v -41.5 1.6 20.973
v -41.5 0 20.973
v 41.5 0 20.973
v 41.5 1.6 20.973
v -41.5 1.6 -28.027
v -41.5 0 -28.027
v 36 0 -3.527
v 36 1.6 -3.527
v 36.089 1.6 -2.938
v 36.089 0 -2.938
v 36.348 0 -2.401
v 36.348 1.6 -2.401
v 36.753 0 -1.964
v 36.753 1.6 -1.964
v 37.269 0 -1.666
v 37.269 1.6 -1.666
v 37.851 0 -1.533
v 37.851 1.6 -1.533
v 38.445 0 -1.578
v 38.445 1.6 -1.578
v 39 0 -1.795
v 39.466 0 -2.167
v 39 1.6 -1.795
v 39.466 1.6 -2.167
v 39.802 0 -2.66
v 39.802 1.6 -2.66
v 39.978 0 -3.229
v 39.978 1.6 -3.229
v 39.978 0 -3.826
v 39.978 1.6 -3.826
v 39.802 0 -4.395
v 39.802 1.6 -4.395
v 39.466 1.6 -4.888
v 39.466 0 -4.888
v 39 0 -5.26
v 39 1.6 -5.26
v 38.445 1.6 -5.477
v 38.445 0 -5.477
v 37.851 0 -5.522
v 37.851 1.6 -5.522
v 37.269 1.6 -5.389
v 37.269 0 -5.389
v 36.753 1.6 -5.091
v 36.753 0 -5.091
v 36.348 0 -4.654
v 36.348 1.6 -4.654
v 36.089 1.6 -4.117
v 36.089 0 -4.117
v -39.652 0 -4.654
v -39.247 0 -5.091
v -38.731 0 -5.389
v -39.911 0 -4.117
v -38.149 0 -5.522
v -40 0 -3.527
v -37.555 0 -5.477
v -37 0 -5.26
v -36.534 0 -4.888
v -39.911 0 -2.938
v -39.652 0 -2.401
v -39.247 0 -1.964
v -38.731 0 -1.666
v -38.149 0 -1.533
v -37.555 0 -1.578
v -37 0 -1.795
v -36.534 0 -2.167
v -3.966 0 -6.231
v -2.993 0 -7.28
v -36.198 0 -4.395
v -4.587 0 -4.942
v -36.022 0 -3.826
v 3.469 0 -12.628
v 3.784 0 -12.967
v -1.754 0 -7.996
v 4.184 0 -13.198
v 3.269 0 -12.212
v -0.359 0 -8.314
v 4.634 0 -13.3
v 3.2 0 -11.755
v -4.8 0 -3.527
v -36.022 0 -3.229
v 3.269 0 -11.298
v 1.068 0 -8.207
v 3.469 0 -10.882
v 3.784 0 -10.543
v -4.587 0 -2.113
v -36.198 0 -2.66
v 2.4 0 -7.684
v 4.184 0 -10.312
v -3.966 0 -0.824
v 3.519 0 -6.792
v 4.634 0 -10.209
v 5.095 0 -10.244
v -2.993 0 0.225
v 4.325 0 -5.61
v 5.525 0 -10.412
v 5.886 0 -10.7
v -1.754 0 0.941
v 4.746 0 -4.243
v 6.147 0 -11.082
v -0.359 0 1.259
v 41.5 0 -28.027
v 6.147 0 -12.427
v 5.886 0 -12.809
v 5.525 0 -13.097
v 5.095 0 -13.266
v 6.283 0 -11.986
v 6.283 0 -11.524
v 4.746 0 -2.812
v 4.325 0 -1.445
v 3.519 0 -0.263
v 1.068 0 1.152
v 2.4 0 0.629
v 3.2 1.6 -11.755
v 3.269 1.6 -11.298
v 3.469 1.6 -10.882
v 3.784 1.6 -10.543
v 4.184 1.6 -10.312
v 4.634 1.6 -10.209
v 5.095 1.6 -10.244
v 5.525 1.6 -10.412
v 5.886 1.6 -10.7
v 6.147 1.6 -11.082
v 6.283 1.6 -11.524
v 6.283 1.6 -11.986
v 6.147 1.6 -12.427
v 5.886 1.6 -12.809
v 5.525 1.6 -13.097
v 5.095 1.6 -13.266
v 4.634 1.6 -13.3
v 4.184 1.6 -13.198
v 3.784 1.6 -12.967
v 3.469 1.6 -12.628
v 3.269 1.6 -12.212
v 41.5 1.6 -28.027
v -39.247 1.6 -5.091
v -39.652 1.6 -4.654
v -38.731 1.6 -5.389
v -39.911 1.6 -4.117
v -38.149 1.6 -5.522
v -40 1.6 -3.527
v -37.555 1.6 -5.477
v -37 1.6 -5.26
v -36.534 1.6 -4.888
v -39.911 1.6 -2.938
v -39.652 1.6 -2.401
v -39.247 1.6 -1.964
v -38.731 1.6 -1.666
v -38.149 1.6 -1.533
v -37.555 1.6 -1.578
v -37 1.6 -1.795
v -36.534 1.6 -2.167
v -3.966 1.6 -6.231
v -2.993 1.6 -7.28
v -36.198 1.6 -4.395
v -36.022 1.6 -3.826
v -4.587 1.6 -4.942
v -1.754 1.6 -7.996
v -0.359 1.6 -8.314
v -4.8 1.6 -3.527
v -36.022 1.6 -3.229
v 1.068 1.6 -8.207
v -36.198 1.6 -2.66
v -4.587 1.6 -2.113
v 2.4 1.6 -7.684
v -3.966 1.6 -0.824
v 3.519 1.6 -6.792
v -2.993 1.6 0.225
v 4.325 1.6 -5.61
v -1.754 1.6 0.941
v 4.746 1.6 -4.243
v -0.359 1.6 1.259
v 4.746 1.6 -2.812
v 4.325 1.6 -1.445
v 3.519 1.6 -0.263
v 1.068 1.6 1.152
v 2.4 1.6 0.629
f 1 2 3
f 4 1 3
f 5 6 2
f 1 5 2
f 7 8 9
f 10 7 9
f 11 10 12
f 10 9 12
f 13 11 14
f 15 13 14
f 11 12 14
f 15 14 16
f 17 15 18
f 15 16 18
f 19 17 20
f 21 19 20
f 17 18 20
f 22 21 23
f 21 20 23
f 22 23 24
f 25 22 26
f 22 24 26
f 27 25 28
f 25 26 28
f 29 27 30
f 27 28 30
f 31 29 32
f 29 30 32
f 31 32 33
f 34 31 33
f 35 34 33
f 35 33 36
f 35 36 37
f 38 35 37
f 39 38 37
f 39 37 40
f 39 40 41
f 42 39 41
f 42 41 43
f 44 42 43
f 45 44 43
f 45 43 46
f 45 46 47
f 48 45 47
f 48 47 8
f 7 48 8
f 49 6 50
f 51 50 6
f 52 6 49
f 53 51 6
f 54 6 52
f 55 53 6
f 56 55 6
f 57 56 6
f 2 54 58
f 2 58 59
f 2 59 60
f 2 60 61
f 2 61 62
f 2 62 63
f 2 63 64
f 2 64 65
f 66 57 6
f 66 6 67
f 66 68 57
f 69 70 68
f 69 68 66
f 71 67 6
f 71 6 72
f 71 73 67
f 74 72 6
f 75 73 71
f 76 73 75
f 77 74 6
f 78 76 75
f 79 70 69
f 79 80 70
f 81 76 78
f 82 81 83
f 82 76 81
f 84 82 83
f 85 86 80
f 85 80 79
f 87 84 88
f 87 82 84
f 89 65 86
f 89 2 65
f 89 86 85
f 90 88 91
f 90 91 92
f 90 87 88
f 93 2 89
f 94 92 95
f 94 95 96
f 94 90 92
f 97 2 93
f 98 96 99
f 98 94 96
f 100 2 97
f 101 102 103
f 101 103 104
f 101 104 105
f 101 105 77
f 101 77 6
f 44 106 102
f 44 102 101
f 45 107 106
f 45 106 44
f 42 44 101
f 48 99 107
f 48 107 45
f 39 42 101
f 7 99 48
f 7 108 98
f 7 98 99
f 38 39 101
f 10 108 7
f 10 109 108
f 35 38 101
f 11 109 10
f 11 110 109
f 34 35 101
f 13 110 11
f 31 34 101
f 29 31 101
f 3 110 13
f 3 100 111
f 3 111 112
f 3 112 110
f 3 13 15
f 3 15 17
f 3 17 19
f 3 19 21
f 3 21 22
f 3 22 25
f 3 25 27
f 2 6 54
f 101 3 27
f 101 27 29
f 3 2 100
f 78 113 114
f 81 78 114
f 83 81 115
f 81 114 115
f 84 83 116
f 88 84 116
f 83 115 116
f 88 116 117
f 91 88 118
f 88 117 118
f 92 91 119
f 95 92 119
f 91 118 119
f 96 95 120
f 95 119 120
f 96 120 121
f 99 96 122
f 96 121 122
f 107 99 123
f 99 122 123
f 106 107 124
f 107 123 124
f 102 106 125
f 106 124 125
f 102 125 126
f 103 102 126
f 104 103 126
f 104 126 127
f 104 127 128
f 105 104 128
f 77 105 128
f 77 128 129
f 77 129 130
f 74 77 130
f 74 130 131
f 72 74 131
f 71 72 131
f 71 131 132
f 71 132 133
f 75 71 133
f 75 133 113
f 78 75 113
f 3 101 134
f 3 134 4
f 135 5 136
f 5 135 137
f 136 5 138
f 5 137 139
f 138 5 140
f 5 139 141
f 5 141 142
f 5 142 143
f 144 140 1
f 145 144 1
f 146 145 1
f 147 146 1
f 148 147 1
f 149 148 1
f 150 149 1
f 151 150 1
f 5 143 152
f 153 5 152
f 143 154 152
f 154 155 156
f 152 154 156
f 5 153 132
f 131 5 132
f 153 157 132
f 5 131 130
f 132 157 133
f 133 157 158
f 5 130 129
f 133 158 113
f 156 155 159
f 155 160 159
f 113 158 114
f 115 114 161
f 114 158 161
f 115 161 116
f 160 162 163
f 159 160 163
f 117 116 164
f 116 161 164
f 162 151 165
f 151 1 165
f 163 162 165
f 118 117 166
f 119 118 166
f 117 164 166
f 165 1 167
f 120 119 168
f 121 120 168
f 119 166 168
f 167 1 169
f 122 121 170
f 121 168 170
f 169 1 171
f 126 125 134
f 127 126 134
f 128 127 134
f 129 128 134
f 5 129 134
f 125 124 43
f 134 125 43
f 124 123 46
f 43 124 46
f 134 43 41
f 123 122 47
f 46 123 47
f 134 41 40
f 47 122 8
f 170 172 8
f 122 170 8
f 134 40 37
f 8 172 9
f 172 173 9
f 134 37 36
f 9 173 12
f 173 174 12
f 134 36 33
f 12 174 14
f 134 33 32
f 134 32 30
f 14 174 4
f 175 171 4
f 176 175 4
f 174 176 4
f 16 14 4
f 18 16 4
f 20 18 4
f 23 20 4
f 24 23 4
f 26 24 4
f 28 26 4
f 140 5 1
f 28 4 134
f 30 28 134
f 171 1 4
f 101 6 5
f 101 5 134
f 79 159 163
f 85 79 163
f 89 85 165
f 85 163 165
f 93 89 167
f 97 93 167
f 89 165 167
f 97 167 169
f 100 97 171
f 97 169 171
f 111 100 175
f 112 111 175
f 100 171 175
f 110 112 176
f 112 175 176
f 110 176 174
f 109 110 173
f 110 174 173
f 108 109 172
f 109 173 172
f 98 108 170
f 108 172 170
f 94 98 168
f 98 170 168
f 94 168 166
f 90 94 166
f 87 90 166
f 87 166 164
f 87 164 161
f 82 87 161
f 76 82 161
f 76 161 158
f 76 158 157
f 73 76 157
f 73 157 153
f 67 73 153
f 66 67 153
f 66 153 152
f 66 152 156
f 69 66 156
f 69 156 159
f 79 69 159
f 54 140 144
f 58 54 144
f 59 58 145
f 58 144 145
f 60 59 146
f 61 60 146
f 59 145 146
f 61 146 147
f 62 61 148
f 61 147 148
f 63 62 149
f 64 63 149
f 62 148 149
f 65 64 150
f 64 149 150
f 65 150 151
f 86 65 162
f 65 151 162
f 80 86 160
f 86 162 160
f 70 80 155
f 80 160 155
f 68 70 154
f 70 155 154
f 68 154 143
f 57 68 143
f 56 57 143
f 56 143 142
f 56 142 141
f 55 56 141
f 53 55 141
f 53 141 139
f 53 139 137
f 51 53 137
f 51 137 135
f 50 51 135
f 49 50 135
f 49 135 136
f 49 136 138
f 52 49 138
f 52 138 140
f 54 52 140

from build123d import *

# Parameters (mm, degrees)
F0_W     = 83
F0_H     = 49
F1_DEPTH = 1.6
F3_D     = 4
F4_D     = 9.6
F5_D     = 3.1


with BuildPart() as f1:
    # F0 (on Front) → F1 (new body)
    with BuildSketch(Plane.XZ):
        with Locations((0, -3.527498)):
            Rectangle(F0_W, F0_H)
    extrude(amount=-F1_DEPTH)

    # F3 (through all)
    with Locations(Plane.XZ):
        with Locations((-38, -3.527498), (38, -3.527498)):
            Hole(F3_D / 2)

    # F4 (through all)
    with Locations(Plane.XZ):
        with Locations((0, -3.527498)):
            Hole(F4_D / 2)

    # F5 (through all)
    with Locations(Plane.XZ):
        with Locations((4.75, -11.754739)):
            Hole(F5_D / 2)


solid = f1.part
